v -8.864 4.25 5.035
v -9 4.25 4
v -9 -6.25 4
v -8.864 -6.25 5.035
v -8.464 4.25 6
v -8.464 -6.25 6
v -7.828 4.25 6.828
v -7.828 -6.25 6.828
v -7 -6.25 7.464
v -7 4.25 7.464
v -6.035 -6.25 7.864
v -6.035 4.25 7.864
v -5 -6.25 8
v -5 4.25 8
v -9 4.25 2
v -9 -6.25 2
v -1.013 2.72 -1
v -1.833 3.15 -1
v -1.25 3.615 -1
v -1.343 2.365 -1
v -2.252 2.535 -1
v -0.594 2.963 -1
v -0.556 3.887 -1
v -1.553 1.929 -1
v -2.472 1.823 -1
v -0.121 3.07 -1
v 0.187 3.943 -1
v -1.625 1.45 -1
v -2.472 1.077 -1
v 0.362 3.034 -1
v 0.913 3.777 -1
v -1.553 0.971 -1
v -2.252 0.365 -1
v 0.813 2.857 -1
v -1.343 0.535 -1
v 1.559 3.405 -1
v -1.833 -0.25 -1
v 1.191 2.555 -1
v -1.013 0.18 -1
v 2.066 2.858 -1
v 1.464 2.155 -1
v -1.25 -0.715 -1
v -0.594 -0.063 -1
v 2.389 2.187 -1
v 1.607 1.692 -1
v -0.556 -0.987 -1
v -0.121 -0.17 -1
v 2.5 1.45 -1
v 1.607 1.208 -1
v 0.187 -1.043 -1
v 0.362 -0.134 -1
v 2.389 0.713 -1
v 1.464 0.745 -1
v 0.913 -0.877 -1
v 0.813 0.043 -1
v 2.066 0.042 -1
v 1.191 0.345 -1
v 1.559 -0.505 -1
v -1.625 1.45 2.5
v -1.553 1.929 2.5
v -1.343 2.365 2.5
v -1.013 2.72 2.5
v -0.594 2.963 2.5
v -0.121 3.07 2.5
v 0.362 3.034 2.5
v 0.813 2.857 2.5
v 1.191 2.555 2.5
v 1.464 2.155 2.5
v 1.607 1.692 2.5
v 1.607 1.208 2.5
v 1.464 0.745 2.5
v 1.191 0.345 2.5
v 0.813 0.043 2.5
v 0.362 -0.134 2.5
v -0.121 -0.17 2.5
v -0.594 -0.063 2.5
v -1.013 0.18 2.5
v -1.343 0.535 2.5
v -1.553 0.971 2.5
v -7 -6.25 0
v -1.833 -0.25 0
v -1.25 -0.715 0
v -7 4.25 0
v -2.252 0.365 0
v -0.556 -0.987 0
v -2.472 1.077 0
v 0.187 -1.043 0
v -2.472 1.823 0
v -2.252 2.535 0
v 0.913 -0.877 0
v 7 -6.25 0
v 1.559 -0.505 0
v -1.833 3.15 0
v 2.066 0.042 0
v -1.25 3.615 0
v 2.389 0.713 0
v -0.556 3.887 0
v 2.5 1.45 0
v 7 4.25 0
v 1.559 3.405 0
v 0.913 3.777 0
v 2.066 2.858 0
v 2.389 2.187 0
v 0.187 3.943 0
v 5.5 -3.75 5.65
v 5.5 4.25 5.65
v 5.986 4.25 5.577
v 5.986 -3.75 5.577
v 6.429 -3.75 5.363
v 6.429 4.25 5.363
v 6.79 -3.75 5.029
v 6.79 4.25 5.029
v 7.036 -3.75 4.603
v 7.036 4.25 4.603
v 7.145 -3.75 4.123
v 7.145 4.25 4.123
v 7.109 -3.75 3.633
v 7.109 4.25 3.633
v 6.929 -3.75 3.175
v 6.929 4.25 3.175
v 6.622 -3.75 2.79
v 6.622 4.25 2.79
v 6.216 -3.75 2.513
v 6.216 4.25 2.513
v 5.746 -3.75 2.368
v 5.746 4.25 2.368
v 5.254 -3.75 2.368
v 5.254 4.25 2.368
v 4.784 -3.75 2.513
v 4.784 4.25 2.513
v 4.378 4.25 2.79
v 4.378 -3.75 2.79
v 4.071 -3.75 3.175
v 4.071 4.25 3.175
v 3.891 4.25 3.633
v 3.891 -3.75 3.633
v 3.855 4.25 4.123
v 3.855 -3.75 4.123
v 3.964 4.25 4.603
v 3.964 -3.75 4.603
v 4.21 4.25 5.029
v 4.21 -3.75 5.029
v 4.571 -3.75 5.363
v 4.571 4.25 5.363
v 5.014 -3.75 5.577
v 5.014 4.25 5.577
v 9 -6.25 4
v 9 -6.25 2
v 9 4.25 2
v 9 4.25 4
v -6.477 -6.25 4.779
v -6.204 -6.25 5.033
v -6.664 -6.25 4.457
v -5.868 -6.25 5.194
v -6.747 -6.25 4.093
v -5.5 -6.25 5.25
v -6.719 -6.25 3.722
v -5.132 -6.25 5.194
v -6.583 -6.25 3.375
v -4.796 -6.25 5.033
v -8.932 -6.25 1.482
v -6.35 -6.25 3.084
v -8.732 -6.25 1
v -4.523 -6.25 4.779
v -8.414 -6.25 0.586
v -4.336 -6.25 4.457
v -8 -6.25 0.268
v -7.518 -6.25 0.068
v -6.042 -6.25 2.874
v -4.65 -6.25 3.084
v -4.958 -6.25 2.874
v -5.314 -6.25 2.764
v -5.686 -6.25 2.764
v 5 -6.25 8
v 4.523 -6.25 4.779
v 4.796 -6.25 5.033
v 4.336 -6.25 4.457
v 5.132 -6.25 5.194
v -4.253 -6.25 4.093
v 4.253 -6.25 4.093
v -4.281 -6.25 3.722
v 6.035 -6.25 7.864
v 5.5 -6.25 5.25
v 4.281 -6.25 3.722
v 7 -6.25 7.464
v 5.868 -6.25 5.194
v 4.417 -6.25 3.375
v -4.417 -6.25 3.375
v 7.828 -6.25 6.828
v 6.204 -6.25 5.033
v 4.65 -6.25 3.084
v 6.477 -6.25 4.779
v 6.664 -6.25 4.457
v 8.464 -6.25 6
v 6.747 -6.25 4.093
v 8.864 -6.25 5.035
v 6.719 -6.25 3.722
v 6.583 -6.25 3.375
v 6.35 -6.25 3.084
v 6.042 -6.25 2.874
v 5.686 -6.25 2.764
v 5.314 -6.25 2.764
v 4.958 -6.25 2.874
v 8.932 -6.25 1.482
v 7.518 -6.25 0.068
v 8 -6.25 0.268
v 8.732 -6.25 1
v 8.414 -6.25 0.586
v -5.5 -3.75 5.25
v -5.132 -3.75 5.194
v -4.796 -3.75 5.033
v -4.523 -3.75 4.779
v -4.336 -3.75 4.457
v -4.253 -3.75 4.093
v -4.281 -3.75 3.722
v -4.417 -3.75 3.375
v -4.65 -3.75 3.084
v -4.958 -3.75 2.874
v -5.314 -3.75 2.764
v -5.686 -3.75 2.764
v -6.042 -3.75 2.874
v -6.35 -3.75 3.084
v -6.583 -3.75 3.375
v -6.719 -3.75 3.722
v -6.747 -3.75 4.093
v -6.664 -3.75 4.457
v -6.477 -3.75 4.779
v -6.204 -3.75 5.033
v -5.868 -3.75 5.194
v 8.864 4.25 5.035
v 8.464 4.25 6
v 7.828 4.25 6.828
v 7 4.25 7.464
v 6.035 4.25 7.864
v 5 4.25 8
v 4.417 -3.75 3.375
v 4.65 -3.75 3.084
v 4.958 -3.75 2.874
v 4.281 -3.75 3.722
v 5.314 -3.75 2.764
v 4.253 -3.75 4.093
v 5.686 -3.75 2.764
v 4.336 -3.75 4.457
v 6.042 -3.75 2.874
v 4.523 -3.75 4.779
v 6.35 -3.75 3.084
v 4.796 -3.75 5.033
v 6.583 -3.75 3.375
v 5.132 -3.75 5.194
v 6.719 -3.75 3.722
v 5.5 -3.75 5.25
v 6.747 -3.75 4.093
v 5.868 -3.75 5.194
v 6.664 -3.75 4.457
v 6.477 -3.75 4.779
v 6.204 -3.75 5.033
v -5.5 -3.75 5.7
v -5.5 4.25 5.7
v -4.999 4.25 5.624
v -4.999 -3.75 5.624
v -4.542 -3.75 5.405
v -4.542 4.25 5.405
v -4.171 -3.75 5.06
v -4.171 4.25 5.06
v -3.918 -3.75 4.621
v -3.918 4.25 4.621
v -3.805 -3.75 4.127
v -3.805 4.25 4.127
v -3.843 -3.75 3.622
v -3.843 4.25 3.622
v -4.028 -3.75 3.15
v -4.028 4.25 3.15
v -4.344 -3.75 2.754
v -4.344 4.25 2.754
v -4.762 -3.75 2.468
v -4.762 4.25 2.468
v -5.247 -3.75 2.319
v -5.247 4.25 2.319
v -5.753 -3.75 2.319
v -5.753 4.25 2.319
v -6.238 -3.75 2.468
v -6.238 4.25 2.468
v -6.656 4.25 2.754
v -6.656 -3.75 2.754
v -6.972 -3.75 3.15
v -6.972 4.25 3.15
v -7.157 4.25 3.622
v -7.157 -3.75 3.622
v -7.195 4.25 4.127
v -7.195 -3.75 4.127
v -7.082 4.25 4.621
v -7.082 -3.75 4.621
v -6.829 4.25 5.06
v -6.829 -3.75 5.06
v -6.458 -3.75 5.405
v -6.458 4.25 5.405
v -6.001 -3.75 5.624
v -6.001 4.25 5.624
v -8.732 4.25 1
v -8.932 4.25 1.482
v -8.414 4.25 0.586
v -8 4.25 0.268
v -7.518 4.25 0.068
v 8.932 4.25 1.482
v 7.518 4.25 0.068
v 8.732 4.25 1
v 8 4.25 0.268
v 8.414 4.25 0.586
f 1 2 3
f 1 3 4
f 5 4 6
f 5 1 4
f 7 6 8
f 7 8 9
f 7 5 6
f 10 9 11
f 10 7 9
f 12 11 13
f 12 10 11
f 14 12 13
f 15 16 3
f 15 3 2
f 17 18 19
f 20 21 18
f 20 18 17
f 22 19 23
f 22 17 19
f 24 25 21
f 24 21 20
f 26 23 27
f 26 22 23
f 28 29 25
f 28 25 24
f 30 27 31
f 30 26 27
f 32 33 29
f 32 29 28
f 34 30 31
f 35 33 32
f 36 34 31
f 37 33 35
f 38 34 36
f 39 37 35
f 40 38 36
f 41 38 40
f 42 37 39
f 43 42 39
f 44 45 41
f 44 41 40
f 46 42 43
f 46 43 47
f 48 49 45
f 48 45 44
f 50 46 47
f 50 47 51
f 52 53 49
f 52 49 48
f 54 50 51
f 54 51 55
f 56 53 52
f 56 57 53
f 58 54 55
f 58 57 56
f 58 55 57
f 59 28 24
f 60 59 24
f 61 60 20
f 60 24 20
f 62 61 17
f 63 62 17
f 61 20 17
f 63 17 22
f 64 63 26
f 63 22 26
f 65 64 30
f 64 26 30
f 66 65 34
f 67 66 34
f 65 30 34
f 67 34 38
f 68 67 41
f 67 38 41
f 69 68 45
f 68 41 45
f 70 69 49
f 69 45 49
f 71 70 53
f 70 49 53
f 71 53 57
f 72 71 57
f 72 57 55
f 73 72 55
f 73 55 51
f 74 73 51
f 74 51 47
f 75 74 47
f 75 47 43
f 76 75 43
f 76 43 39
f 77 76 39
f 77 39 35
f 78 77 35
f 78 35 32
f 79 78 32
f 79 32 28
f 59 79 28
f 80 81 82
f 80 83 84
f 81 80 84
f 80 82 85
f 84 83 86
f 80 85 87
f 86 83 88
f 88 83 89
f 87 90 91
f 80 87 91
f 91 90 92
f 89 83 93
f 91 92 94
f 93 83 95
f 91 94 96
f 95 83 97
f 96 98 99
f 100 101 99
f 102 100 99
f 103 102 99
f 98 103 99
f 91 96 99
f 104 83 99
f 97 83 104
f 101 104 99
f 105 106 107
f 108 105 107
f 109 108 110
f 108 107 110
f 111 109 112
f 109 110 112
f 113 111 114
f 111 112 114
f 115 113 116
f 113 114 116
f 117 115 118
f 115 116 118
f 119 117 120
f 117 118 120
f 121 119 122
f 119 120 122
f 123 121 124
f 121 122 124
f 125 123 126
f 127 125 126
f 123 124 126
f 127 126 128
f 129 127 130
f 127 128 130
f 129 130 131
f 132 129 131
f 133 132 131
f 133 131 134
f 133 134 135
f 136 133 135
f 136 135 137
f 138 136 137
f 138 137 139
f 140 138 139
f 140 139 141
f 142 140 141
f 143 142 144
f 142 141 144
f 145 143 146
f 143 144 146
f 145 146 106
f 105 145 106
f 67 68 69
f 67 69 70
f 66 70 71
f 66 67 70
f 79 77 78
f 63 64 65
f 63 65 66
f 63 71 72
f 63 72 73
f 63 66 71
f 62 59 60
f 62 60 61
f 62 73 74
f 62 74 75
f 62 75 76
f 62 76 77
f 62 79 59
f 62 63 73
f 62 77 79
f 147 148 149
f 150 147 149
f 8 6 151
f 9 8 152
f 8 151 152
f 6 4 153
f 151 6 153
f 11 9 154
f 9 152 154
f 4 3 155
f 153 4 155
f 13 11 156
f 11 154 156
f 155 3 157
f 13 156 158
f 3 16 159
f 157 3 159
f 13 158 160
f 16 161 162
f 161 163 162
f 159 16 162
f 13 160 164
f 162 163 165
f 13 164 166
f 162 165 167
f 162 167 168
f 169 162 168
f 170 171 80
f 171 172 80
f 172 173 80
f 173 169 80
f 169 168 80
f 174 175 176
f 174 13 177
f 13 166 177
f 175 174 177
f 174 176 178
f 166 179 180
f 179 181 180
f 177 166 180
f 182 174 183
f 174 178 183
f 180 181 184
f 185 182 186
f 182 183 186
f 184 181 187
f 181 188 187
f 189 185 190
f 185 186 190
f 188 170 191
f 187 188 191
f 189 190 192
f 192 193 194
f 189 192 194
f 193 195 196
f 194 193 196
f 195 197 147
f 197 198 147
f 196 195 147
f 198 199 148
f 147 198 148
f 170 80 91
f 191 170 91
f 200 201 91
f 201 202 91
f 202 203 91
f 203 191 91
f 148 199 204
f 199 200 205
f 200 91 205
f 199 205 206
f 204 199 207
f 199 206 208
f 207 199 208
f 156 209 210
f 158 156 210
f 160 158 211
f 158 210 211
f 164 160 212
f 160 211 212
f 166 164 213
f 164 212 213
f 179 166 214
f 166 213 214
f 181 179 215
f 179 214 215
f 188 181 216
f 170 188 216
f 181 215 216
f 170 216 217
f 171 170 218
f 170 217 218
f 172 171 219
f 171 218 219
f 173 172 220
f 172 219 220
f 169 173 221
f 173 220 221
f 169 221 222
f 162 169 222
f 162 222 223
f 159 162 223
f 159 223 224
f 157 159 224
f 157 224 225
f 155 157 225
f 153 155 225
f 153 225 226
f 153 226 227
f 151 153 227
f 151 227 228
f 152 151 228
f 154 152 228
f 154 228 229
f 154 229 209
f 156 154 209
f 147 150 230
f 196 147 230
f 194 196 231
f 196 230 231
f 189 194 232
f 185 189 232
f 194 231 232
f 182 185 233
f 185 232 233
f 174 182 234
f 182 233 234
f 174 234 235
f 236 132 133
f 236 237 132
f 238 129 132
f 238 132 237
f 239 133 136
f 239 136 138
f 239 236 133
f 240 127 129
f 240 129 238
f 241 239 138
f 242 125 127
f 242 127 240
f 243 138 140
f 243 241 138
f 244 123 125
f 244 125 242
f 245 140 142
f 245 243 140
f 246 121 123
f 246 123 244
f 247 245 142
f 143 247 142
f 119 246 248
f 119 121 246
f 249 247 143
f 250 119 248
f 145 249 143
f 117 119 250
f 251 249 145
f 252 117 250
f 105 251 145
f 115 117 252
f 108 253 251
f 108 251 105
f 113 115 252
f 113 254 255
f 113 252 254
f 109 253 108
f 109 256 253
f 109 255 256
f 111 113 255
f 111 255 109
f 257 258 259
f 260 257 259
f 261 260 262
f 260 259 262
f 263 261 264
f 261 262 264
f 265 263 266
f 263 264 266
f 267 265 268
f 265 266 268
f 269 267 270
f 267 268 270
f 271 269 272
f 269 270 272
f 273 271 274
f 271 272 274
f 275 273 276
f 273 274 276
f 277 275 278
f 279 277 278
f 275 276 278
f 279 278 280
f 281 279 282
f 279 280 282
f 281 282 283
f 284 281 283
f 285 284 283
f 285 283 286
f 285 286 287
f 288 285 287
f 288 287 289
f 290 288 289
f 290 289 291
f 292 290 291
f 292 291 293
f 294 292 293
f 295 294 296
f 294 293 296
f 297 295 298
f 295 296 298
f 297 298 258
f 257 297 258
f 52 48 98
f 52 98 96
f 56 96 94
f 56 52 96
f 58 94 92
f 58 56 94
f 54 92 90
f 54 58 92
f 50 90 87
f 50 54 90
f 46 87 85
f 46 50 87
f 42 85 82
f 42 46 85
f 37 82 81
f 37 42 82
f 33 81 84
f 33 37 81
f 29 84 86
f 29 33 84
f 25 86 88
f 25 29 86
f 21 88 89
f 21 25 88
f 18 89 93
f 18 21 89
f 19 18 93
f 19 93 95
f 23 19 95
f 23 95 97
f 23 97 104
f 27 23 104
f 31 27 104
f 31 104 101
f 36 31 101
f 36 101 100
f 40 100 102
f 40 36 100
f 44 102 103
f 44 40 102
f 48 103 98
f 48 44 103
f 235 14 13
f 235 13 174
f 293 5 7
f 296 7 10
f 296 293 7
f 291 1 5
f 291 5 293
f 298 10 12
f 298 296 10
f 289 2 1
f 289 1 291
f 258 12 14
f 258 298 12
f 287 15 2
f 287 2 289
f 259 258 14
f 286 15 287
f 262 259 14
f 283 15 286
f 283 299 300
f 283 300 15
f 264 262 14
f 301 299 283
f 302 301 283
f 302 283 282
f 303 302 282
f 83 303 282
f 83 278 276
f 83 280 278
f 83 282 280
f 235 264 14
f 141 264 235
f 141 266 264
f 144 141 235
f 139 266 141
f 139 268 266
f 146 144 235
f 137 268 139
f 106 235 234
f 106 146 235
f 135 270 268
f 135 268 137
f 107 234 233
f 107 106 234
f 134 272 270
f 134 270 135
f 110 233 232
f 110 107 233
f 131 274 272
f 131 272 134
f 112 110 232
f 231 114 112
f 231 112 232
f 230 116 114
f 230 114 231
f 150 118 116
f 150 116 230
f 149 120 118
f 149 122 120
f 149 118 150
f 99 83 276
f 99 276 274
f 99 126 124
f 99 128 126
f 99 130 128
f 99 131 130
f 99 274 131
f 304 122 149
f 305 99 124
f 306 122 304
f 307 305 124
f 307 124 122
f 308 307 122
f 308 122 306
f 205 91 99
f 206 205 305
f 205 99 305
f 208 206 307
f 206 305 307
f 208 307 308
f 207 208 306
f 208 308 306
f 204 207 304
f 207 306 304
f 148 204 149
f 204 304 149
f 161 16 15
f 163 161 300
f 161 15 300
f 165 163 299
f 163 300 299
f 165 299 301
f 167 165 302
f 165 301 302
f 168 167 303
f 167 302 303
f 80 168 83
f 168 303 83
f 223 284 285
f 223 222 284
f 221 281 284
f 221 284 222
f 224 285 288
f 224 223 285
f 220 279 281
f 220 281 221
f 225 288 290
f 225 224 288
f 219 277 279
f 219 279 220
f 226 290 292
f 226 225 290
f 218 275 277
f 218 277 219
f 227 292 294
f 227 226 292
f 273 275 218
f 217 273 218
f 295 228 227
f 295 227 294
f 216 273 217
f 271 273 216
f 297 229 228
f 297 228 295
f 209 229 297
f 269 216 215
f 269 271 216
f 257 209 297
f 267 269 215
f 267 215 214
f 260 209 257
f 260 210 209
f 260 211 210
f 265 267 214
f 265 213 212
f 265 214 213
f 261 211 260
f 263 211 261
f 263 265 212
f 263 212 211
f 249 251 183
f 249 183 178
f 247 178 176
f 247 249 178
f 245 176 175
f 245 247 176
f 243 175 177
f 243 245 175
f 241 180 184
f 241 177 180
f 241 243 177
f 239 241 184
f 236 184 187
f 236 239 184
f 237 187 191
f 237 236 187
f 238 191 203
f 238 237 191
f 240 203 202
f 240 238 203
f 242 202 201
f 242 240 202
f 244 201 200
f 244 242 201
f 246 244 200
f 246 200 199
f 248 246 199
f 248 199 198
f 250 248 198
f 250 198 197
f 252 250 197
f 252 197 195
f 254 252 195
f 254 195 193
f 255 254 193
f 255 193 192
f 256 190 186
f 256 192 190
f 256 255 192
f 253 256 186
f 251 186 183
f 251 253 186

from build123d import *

# Parameters (mm, degrees)
SKETCH_1_W          = 18
SKETCH_1_H          = 12.5
EXTRUDE_1_DEPTH     = 8
SKETCH_2_R          = 1.625
CUT_EXTRUDE_1_DEPTH = 2.5
EXTRUDE_START       = 1
SKETCH_3_R          = 2.5
SKETCH_3_R_2        = 1.625
EXTRUDE_2_DEPTH     = 1
SKETCH_4_R          = 1.25
CUT_EXTRUDE_2_DEPTH = 25
FILLET_1_R          = 4
FILLET_2_R          = 2
CUT_EXTRUDE_3_DEPTH = 2
SKETCH_6_R          = 1.65
SKETCH_6_R_2        = 1.7
CUT_EXTRUDE_4_DEPTH = 8


with BuildPart() as part:
    # 草图1 → 凸台-拉伸1 (new body)
    with BuildSketch(Plane.XY):
        Rectangle(SKETCH_1_W, SKETCH_1_H)
    extrude(amount=EXTRUDE_1_DEPTH)

    # 草图2 → 切除-拉伸1 (cut, symmetric)
    with BuildSketch(Plane(origin=(0, 0, 0), x_dir=(-1, 0, 0), z_dir=(0, 0, -1))):
        with Locations((0, 1.45)):
            Circle(SKETCH_2_R)
    extrude(amount=CUT_EXTRUDE_1_DEPTH, both=True, mode=Mode.SUBTRACT)

    # 草图3 → 凸台-拉伸2 (add)
    with BuildSketch(Plane(origin=(0, 0, 0), x_dir=(-1, 0, 0), z_dir=(0, 0, -1)).offset(EXTRUDE_START)):
        with Locations(Location((0, 1.45, 0), (0, 0, 180))):
            Circle(SKETCH_3_R)
        with Locations((0, 1.45)):
            Circle(SKETCH_3_R_2, mode=Mode.SUBTRACT)
    extrude(amount=-EXTRUDE_2_DEPTH)

    # 草图4 → 切除-拉伸2 (cut)
    with BuildSketch(Plane(origin=(0, 6.25, 0), x_dir=(1, 0, 0), z_dir=(0, 1, 0))):
        with Locations(Location((-5.5, -4, 0), (0, 0, 270))):
            Circle(SKETCH_4_R)
    cut_extrude_2 = extrude(amount=-CUT_EXTRUDE_2_DEPTH, mode=Mode.SUBTRACT)

    # 镜向1: 切除-拉伸2 across plane
    add(cut_extrude_2.mirror(Plane(origin=(0, 0, 0), x_dir=(0, 0, 1), z_dir=(1, 0, 0))), mode=Mode.SUBTRACT)

    # 圆角1
    fillet_1_edges = [part.edges().sort_by_distance(p)[0] for p in [
        (-9, 0, 8),
        (9, 0, 8),
    ]]
    fillet(fillet_1_edges, radius=FILLET_1_R)

    # 圆角2
    fillet_2_edges = [part.edges().sort_by_distance(p)[0] for p in [
        (-9, 0, 0),
        (9, 0, 0),
    ]]
    fillet(fillet_2_edges, radius=FILLET_2_R)

    # 草图5 → 切除-拉伸3 (cut)
    with BuildSketch(Plane(origin=(0, 6.25, 0), x_dir=(1, 0, 0), z_dir=(0, 1, 0))):
        with BuildLine():
            Line((7, 0), (-7, 0))
            ThreePointArc((-7, 0), (-8.414213562, -0.585786438), (-9, -2))
            Line((-9, -2), (-9, -4))
            ThreePointArc((-9, -4), (-7.828427125, -6.828427125), (-5, -8))
            Line((-5, -8), (5, -8))
            ThreePointArc((5, -8), (7.828427125, -6.828427125), (9, -4))
            Line((9, -4), (9, -2))
            ThreePointArc((9, -2), (8.414213562, -0.585786438), (7, 0))
        make_face()
    extrude(amount=-CUT_EXTRUDE_3_DEPTH, mode=Mode.SUBTRACT)

    # 草图6 → 切除-拉伸4 (cut)
    with BuildSketch(Plane(origin=(0, 4.25, 0), x_dir=(1, 0, 0), z_dir=(0, 1, 0))):
        with Locations(Location((5.5, -4, 0), (0, 0, 270))):
            Circle(SKETCH_6_R)
        with Locations(Location((-5.5, -4, 0), (0, 0, 270))):
            Circle(SKETCH_6_R_2)
    extrude(amount=-CUT_EXTRUDE_4_DEPTH, mode=Mode.SUBTRACT)


solid = part.part
